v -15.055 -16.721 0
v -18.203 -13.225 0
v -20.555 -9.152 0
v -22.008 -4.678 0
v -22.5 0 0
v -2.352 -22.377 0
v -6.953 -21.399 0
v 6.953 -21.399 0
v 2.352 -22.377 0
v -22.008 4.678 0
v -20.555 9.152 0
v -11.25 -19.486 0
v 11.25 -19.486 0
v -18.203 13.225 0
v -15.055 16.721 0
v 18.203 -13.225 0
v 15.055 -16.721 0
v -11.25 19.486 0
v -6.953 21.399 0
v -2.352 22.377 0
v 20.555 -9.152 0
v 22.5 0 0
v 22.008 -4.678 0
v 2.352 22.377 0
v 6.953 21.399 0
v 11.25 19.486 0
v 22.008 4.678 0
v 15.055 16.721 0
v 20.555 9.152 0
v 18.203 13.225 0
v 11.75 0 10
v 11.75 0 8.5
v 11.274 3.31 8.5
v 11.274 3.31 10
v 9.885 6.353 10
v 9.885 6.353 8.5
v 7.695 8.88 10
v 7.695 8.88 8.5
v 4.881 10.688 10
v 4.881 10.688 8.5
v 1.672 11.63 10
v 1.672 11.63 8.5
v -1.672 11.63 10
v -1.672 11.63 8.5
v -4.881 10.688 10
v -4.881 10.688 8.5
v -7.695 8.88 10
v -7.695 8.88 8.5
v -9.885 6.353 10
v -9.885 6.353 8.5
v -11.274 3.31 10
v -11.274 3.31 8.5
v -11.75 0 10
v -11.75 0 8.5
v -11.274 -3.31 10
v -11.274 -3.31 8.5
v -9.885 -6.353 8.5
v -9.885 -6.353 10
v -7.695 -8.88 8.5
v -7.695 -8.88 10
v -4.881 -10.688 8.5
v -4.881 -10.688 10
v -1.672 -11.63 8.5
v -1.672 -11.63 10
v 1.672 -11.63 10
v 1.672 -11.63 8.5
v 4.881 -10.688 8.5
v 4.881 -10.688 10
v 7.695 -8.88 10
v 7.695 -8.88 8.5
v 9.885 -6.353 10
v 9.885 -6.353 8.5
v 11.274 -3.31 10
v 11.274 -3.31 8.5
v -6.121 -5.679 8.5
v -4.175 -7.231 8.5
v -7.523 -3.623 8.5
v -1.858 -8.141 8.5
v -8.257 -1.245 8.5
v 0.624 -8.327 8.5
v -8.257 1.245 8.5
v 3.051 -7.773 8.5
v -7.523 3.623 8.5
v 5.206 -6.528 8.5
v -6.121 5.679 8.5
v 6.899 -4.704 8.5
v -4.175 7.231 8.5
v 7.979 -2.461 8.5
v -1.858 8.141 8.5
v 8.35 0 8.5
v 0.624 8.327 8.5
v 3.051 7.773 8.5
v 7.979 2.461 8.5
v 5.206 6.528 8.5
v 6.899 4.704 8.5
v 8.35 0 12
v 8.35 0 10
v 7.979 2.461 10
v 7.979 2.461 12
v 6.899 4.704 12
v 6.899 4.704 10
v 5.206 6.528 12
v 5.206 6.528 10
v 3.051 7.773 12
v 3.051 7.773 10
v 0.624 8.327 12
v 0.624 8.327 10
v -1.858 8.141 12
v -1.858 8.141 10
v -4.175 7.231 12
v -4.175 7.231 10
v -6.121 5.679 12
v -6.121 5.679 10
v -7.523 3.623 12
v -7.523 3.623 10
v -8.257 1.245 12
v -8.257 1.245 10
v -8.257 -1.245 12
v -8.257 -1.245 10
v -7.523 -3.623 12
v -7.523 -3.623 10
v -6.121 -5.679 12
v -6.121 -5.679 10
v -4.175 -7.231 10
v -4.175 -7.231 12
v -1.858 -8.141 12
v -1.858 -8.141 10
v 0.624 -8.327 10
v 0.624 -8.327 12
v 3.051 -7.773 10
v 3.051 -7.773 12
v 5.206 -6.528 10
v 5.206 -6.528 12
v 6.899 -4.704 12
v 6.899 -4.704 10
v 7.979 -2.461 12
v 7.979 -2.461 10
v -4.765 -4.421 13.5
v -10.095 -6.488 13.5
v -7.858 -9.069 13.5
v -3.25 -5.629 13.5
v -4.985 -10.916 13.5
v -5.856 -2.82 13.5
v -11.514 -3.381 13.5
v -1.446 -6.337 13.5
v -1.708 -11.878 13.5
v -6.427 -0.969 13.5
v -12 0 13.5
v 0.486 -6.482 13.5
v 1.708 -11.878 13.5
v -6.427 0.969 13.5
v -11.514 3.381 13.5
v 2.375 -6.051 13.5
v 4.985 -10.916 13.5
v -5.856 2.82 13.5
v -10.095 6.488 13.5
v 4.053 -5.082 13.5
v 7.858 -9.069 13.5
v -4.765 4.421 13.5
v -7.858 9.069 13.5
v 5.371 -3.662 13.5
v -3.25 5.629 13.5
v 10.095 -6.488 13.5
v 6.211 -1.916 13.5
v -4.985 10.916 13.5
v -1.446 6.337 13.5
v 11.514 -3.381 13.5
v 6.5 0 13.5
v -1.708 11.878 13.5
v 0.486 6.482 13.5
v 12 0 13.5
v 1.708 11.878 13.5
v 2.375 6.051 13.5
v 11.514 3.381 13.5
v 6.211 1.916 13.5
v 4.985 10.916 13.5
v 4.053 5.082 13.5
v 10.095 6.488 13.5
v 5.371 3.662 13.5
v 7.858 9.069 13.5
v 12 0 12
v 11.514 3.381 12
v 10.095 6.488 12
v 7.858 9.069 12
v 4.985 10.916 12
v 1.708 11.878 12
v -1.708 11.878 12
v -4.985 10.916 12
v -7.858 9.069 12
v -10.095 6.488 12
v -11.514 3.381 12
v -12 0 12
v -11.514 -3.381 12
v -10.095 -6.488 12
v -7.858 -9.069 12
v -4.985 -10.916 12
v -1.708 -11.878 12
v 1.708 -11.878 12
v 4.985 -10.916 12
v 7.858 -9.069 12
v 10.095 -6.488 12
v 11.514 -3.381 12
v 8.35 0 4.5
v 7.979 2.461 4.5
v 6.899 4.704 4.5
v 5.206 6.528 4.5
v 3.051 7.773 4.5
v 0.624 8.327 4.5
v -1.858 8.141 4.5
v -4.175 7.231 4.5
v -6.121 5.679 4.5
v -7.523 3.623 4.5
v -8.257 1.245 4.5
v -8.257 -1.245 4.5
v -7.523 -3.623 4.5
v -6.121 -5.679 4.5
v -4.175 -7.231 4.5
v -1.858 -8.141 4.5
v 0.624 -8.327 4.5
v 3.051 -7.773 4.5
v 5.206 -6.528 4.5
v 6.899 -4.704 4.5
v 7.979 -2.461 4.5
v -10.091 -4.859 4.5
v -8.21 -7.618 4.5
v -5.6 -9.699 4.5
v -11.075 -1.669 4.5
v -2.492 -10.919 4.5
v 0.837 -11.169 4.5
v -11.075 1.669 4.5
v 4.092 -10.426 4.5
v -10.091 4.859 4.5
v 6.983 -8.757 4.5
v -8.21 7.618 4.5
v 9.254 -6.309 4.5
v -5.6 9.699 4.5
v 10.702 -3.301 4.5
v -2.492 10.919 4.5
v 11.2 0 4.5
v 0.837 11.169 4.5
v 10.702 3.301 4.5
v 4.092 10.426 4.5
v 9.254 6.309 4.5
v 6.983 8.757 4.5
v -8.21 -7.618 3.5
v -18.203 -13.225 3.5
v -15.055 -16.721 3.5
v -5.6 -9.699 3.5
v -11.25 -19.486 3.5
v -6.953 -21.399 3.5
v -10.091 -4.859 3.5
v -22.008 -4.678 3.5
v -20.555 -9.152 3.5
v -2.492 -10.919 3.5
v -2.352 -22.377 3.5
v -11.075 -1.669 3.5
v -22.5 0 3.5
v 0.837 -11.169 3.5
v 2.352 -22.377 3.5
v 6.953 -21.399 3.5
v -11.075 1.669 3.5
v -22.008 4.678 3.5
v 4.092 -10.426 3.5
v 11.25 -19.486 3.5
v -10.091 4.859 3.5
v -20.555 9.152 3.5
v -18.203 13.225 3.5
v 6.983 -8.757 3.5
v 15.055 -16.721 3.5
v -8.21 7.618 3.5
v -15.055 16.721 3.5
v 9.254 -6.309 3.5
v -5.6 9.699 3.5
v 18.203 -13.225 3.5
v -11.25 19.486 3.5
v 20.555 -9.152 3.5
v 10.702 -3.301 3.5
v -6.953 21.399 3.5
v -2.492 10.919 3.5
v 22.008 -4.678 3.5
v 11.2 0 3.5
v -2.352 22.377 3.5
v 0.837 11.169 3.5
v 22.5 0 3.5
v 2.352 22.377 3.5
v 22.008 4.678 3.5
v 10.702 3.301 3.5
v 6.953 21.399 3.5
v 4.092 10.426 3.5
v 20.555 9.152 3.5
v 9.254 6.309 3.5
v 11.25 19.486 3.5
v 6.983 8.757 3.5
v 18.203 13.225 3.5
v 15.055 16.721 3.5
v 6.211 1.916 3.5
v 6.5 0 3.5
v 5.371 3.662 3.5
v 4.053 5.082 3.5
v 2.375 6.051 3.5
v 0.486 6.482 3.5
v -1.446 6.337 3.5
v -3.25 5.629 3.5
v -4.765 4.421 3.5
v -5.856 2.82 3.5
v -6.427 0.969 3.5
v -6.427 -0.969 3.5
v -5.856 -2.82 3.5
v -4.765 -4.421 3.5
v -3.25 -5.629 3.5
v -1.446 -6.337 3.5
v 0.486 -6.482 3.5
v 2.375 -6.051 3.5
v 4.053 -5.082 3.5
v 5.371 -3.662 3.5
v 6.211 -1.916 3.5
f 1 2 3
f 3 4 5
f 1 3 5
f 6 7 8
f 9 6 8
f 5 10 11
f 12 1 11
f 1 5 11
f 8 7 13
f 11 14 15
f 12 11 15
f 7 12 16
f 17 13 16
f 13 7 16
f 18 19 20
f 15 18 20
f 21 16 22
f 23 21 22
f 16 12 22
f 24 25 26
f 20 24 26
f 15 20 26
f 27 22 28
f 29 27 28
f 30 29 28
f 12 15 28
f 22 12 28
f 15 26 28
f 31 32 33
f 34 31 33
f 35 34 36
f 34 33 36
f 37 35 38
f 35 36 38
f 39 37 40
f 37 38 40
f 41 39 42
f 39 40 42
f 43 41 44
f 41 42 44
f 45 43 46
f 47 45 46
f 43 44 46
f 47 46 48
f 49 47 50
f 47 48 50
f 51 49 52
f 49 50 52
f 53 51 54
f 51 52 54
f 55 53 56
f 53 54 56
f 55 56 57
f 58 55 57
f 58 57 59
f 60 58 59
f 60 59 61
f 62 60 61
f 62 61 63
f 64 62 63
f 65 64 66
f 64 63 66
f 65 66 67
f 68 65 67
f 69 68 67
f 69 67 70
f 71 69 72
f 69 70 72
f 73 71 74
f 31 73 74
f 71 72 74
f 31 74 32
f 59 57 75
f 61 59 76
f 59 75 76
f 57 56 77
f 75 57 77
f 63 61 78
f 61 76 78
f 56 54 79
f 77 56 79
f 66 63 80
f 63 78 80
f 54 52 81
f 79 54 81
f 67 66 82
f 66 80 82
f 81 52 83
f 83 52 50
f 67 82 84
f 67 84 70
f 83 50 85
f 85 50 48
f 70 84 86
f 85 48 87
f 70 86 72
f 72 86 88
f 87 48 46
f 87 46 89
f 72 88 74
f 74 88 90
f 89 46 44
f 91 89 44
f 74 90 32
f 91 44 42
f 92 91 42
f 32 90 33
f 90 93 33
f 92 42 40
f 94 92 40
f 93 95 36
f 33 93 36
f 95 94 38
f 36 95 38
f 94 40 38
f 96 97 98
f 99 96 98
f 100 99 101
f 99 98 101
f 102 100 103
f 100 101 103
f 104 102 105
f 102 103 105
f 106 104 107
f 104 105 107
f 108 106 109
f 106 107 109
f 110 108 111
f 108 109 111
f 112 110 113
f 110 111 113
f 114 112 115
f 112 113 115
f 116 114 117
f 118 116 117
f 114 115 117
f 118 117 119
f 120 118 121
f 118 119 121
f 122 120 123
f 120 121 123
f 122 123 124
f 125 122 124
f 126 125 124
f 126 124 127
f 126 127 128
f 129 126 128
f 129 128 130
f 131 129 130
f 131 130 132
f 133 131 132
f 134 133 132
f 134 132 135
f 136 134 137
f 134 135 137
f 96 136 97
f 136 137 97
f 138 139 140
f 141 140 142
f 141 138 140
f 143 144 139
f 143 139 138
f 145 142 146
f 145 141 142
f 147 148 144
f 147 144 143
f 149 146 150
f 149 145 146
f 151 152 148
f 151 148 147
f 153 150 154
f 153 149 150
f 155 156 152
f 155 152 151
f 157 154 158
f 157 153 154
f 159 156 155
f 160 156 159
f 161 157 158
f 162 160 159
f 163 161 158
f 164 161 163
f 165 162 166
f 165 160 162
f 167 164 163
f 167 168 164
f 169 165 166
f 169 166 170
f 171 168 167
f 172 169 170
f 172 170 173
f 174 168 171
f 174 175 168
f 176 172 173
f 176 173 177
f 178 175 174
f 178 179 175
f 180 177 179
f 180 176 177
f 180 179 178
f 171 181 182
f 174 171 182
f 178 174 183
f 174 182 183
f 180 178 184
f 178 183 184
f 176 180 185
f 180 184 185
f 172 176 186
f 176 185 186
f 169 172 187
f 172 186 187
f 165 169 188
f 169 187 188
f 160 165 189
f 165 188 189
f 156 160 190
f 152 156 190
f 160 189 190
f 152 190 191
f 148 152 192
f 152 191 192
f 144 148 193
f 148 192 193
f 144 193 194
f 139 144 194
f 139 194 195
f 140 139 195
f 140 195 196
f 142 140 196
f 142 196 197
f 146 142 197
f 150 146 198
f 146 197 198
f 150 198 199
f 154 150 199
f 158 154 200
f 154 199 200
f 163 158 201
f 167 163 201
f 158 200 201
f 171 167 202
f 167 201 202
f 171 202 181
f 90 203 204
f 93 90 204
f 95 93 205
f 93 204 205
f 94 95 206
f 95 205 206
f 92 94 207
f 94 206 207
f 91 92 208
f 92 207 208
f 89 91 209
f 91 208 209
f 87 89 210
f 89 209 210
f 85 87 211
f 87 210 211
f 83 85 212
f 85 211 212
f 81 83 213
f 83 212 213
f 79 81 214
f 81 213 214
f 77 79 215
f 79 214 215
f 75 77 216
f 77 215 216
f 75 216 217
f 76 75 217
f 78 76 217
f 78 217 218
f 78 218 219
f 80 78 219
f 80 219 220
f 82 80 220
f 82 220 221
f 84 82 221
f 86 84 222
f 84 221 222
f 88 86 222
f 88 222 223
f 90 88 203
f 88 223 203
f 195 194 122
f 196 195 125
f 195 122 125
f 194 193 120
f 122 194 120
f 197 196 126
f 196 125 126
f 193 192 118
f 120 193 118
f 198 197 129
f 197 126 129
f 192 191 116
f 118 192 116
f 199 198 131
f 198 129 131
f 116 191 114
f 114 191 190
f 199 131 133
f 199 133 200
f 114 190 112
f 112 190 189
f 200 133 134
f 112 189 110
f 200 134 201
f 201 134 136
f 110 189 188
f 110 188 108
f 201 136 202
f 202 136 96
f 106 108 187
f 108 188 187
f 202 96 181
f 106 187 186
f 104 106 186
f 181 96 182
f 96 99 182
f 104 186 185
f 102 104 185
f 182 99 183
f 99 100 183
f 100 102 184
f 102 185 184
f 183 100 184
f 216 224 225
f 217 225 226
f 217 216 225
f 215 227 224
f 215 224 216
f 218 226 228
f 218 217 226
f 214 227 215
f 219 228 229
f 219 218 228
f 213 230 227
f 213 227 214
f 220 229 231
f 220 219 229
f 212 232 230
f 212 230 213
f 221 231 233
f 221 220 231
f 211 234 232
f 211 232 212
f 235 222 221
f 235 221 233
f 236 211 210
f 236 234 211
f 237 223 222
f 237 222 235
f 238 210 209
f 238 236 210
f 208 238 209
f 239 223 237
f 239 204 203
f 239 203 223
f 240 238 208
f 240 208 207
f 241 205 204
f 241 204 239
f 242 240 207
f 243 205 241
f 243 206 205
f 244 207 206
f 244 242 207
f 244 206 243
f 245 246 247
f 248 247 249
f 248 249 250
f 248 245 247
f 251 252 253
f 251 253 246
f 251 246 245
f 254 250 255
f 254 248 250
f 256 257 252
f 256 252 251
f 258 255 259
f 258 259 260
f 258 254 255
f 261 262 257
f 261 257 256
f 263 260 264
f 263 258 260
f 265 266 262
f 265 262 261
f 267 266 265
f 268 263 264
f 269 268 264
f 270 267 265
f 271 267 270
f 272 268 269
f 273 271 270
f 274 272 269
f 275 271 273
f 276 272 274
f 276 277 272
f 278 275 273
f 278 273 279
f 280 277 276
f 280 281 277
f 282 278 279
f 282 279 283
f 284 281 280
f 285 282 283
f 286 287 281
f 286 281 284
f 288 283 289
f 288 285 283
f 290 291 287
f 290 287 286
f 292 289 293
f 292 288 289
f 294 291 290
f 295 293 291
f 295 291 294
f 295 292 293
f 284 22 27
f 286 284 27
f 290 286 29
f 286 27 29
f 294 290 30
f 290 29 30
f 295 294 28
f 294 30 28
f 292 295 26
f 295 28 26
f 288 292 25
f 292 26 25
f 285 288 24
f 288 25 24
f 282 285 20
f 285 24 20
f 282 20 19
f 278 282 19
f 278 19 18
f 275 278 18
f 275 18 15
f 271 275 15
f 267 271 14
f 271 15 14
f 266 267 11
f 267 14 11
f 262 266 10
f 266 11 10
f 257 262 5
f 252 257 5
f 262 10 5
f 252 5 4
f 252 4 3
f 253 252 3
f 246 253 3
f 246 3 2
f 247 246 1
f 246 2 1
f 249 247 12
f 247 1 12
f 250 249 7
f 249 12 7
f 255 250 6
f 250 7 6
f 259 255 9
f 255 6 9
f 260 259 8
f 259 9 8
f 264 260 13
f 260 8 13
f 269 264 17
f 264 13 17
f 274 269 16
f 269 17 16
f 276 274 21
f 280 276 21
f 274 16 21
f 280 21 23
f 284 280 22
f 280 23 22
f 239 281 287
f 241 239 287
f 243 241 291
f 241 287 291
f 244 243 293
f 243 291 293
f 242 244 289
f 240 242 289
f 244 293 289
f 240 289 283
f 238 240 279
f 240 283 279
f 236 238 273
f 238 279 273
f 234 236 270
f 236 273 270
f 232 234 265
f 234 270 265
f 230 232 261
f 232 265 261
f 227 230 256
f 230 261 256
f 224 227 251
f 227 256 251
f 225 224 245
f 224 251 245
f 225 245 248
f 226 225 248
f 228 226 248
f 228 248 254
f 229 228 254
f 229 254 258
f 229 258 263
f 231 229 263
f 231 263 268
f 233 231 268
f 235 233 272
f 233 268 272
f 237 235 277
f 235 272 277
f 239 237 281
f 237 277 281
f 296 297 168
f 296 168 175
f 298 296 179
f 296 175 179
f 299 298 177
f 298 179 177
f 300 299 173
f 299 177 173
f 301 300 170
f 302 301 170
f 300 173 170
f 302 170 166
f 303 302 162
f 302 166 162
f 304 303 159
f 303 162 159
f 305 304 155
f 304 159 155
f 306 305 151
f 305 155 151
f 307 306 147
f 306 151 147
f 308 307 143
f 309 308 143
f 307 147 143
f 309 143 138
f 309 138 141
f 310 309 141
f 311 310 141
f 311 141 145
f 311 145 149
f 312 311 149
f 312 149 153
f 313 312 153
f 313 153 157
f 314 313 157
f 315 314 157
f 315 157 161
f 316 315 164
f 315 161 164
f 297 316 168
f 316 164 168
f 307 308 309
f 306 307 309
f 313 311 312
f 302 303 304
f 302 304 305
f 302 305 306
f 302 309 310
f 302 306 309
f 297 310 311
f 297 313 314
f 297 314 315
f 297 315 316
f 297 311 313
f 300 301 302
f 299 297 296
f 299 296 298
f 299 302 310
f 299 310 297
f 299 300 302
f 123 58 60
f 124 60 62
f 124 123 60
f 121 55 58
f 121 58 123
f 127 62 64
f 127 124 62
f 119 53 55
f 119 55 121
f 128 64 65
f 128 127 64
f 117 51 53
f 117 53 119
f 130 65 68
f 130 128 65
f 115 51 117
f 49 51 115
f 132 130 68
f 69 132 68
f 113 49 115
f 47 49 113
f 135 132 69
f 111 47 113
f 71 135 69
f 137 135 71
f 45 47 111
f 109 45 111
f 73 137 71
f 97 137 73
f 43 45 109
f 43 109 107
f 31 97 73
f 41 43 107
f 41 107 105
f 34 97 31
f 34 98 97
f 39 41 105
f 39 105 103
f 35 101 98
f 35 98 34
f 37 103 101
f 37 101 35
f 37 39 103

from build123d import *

# Parameters (mm, degrees)
F0_R      = 22.5
F1_DEPTH  = 3.5
F2_R      = 11.2
F3_DEPTH  = 1
F4_R      = 8.35
F5_DEPTH  = 4
F6_R      = 11.75
F7_DEPTH  = 1.5
F8_R      = 8.35
F9_DEPTH  = 2
F10_R     = 12
F11_DEPTH = 1.5
F12_R     = 6.5
F13_DEPTH = 10


with BuildPart() as f1:
    # F0 (on Top) → F1 (new body)
    with BuildSketch(Plane.XY):
        Circle(F0_R)
    extrude(amount=F1_DEPTH)

    # F2 (on face) → F3 (join)
    with BuildSketch(Plane.XY.offset(3.5)):
        Circle(F2_R)
    extrude(amount=F3_DEPTH)

    # F4 (on face) → F5 (join)
    with BuildSketch(Plane.XY.offset(4.5)):
        Circle(F4_R)
    extrude(amount=F5_DEPTH)

    # F6 (on face) → F7 (join)
    with BuildSketch(Plane.XY.offset(8.5)):
        Circle(F6_R)
    extrude(amount=F7_DEPTH)

    # F8 (on face) → F9 (join)
    with BuildSketch(Plane.XY.offset(10)):
        Circle(F8_R)
    extrude(amount=F9_DEPTH)

    # F10 (on face) → F11 (join)
    with BuildSketch(Plane.XY.offset(12)):
        Circle(F10_R)
    extrude(amount=F11_DEPTH)

    # F12 (on face) → F13 (cut, through all)
    with BuildSketch(Plane.XY.offset(13.5)):
        Circle(F12_R)
    extrude(amount=-F13_DEPTH, mode=Mode.SUBTRACT)


solid = f1.part
